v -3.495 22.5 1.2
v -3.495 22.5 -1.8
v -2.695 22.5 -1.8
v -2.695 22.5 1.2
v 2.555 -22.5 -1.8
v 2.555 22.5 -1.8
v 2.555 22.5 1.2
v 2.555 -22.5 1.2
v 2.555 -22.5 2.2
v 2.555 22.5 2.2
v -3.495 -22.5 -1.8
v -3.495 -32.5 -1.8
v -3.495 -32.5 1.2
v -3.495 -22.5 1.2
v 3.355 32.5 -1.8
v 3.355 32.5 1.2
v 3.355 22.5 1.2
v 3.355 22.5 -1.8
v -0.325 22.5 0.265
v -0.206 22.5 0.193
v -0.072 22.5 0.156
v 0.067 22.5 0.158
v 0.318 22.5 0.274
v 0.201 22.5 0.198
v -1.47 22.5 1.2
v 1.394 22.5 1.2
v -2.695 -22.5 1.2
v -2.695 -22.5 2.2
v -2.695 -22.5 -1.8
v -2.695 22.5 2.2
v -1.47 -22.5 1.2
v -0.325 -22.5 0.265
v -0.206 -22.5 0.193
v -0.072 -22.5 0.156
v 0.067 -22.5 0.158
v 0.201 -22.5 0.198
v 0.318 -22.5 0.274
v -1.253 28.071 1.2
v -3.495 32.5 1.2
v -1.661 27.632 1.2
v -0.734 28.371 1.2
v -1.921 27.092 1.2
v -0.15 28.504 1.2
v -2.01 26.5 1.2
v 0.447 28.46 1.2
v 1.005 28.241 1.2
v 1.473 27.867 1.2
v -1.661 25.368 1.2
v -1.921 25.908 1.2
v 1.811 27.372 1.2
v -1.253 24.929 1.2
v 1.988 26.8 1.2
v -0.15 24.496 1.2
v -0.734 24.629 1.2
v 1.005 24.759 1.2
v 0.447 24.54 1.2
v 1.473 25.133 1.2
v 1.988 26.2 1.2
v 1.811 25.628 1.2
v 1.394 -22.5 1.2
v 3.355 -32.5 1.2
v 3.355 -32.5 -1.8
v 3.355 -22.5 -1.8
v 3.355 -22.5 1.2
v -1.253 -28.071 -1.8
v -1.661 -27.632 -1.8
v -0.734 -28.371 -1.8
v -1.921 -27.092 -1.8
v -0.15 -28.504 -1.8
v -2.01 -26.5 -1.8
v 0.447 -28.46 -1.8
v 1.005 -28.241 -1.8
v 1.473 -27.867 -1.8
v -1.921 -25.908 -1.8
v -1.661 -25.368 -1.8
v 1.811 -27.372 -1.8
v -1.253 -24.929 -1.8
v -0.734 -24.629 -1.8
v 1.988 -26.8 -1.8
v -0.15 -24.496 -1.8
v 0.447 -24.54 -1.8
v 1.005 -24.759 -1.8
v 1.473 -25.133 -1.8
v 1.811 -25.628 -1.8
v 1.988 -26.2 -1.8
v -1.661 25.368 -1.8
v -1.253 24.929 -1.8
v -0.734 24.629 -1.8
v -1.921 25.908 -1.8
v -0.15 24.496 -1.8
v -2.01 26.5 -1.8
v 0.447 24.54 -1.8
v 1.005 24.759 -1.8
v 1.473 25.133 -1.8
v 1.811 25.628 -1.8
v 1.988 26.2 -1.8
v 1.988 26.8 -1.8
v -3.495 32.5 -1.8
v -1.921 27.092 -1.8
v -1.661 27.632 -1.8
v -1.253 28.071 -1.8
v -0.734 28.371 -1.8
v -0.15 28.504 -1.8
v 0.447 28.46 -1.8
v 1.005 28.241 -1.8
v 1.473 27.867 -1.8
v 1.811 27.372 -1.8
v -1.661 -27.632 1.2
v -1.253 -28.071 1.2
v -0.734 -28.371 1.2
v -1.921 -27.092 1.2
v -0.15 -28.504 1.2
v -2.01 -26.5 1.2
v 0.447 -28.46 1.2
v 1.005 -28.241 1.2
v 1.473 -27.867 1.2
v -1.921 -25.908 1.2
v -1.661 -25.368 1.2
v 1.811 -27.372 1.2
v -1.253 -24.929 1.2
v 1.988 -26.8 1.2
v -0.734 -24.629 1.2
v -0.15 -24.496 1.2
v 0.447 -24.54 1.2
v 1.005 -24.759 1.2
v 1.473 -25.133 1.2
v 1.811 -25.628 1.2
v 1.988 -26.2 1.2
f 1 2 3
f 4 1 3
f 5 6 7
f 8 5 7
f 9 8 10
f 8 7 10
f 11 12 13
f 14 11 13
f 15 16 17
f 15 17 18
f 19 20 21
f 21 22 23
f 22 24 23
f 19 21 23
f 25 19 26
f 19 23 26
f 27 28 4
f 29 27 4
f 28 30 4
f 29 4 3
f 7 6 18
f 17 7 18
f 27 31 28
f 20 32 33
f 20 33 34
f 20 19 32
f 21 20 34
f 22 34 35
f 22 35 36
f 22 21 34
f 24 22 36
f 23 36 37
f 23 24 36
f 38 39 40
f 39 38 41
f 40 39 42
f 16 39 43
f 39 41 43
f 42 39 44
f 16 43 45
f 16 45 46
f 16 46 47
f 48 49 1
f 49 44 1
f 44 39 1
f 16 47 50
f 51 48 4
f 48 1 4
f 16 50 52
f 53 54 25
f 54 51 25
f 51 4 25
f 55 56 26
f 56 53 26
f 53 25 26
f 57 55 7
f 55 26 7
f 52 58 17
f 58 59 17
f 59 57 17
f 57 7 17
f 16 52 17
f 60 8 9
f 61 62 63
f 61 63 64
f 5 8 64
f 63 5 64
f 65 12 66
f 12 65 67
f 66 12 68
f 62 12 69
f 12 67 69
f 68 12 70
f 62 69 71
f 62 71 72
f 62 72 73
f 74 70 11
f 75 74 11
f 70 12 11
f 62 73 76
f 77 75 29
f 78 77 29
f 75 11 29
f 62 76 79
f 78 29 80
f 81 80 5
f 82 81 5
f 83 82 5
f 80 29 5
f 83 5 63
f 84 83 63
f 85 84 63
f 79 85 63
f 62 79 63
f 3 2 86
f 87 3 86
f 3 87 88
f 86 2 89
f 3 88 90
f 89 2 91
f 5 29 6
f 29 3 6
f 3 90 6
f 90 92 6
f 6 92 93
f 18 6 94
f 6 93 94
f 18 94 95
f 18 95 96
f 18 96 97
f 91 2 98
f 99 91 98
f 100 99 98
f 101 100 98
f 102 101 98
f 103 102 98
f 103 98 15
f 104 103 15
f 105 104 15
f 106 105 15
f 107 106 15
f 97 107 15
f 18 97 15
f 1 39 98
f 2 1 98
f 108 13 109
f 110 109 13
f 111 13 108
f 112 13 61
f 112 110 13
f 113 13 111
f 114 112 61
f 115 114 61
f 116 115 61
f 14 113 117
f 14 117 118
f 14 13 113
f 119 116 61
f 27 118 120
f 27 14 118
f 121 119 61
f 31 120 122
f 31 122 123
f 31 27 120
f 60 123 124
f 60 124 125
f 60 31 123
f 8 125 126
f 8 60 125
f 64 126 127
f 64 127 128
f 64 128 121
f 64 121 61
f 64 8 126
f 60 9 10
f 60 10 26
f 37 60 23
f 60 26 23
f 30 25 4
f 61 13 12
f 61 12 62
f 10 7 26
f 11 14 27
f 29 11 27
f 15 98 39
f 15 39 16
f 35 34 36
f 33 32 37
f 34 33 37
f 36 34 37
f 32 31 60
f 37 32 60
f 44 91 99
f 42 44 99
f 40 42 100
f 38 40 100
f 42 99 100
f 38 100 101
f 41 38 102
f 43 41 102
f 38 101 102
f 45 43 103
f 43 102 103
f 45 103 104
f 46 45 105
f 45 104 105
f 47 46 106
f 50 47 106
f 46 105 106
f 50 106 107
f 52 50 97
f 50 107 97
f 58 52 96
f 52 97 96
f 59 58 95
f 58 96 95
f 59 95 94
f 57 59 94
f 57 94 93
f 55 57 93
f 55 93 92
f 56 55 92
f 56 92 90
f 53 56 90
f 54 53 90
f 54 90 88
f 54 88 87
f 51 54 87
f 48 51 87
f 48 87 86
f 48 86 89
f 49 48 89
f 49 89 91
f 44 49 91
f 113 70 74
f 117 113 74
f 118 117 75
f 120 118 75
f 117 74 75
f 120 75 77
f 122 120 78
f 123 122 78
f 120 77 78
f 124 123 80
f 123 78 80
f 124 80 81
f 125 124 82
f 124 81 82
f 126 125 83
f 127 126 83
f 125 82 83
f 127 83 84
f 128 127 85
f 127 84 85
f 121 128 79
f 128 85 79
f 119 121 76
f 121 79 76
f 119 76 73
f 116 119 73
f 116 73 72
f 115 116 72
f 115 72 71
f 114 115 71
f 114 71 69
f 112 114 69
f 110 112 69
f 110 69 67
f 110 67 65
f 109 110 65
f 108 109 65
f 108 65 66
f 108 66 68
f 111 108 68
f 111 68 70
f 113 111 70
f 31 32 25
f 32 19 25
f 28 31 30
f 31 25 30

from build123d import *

# Parameters (mm, degrees)
BOSS_EXTRUDE1_DEPTH = 22.5
SKETCH2_W           = 6.85
SKETCH2_H           = 3
BOSS_EXTRUDE2_DEPTH = 10
SKETCH3_W           = 6.85
SKETCH3_H           = 3
BOSS_EXTRUDE3_DEPTH = 10
FILLET2_R           = 0.5
SKETCH5_R           = 2.01
CUT_EXTRUDE1_DEPTH  = 10


with BuildPart() as part:
    # Sketch1 → Boss-Extrude1 (new body, symmetric)
    with BuildSketch(Plane(origin=(0, 0, 0), x_dir=(1, 0, 0), z_dir=(0, 1, 0))):
        Polygon((0, 0), (-2.69457677, -2.2), (-2.69457677, 1.8), (2.55542323, 1.8), (2.55542323, -2.2), align=None)
    extrude(amount=BOSS_EXTRUDE1_DEPTH, both=True)

    # Sketch2 → Boss-Extrude2 (add)
    with BuildSketch(Plane(origin=(0, 22.5, 0), x_dir=(1, 0, 0), z_dir=(0, 1, 0))):
        with Locations((-0.06957677, 0.3)):
            Rectangle(SKETCH2_W, SKETCH2_H)
    extrude(amount=BOSS_EXTRUDE2_DEPTH)

    # Sketch3 → Boss-Extrude3 (add)
    with BuildSketch(Plane.XZ.offset(22.5)):
        with Locations((-0.06957677, -0.3)):
            Rectangle(SKETCH3_W, SKETCH3_H)
    extrude(amount=BOSS_EXTRUDE3_DEPTH)

    # Fillet2
    fillet2_edges = [part.edges().sort_by_distance(p)[0] for p in [
        (0, 0, 0),
    ]]
    fillet(fillet2_edges, radius=FILLET2_R)

    # Sketch5 → Cut-Extrude1 (cut)
    with BuildSketch(Plane(origin=(0, 0, -1.8), x_dir=(-1, 0, 0), z_dir=(0, 0, -1))):
        with Locations((0, -26.5)):
            Circle(SKETCH5_R)
        with Locations((0, 26.5)):
            Circle(SKETCH5_R)
    extrude(amount=-CUT_EXTRUDE1_DEPTH, mode=Mode.SUBTRACT)


solid = part.part
